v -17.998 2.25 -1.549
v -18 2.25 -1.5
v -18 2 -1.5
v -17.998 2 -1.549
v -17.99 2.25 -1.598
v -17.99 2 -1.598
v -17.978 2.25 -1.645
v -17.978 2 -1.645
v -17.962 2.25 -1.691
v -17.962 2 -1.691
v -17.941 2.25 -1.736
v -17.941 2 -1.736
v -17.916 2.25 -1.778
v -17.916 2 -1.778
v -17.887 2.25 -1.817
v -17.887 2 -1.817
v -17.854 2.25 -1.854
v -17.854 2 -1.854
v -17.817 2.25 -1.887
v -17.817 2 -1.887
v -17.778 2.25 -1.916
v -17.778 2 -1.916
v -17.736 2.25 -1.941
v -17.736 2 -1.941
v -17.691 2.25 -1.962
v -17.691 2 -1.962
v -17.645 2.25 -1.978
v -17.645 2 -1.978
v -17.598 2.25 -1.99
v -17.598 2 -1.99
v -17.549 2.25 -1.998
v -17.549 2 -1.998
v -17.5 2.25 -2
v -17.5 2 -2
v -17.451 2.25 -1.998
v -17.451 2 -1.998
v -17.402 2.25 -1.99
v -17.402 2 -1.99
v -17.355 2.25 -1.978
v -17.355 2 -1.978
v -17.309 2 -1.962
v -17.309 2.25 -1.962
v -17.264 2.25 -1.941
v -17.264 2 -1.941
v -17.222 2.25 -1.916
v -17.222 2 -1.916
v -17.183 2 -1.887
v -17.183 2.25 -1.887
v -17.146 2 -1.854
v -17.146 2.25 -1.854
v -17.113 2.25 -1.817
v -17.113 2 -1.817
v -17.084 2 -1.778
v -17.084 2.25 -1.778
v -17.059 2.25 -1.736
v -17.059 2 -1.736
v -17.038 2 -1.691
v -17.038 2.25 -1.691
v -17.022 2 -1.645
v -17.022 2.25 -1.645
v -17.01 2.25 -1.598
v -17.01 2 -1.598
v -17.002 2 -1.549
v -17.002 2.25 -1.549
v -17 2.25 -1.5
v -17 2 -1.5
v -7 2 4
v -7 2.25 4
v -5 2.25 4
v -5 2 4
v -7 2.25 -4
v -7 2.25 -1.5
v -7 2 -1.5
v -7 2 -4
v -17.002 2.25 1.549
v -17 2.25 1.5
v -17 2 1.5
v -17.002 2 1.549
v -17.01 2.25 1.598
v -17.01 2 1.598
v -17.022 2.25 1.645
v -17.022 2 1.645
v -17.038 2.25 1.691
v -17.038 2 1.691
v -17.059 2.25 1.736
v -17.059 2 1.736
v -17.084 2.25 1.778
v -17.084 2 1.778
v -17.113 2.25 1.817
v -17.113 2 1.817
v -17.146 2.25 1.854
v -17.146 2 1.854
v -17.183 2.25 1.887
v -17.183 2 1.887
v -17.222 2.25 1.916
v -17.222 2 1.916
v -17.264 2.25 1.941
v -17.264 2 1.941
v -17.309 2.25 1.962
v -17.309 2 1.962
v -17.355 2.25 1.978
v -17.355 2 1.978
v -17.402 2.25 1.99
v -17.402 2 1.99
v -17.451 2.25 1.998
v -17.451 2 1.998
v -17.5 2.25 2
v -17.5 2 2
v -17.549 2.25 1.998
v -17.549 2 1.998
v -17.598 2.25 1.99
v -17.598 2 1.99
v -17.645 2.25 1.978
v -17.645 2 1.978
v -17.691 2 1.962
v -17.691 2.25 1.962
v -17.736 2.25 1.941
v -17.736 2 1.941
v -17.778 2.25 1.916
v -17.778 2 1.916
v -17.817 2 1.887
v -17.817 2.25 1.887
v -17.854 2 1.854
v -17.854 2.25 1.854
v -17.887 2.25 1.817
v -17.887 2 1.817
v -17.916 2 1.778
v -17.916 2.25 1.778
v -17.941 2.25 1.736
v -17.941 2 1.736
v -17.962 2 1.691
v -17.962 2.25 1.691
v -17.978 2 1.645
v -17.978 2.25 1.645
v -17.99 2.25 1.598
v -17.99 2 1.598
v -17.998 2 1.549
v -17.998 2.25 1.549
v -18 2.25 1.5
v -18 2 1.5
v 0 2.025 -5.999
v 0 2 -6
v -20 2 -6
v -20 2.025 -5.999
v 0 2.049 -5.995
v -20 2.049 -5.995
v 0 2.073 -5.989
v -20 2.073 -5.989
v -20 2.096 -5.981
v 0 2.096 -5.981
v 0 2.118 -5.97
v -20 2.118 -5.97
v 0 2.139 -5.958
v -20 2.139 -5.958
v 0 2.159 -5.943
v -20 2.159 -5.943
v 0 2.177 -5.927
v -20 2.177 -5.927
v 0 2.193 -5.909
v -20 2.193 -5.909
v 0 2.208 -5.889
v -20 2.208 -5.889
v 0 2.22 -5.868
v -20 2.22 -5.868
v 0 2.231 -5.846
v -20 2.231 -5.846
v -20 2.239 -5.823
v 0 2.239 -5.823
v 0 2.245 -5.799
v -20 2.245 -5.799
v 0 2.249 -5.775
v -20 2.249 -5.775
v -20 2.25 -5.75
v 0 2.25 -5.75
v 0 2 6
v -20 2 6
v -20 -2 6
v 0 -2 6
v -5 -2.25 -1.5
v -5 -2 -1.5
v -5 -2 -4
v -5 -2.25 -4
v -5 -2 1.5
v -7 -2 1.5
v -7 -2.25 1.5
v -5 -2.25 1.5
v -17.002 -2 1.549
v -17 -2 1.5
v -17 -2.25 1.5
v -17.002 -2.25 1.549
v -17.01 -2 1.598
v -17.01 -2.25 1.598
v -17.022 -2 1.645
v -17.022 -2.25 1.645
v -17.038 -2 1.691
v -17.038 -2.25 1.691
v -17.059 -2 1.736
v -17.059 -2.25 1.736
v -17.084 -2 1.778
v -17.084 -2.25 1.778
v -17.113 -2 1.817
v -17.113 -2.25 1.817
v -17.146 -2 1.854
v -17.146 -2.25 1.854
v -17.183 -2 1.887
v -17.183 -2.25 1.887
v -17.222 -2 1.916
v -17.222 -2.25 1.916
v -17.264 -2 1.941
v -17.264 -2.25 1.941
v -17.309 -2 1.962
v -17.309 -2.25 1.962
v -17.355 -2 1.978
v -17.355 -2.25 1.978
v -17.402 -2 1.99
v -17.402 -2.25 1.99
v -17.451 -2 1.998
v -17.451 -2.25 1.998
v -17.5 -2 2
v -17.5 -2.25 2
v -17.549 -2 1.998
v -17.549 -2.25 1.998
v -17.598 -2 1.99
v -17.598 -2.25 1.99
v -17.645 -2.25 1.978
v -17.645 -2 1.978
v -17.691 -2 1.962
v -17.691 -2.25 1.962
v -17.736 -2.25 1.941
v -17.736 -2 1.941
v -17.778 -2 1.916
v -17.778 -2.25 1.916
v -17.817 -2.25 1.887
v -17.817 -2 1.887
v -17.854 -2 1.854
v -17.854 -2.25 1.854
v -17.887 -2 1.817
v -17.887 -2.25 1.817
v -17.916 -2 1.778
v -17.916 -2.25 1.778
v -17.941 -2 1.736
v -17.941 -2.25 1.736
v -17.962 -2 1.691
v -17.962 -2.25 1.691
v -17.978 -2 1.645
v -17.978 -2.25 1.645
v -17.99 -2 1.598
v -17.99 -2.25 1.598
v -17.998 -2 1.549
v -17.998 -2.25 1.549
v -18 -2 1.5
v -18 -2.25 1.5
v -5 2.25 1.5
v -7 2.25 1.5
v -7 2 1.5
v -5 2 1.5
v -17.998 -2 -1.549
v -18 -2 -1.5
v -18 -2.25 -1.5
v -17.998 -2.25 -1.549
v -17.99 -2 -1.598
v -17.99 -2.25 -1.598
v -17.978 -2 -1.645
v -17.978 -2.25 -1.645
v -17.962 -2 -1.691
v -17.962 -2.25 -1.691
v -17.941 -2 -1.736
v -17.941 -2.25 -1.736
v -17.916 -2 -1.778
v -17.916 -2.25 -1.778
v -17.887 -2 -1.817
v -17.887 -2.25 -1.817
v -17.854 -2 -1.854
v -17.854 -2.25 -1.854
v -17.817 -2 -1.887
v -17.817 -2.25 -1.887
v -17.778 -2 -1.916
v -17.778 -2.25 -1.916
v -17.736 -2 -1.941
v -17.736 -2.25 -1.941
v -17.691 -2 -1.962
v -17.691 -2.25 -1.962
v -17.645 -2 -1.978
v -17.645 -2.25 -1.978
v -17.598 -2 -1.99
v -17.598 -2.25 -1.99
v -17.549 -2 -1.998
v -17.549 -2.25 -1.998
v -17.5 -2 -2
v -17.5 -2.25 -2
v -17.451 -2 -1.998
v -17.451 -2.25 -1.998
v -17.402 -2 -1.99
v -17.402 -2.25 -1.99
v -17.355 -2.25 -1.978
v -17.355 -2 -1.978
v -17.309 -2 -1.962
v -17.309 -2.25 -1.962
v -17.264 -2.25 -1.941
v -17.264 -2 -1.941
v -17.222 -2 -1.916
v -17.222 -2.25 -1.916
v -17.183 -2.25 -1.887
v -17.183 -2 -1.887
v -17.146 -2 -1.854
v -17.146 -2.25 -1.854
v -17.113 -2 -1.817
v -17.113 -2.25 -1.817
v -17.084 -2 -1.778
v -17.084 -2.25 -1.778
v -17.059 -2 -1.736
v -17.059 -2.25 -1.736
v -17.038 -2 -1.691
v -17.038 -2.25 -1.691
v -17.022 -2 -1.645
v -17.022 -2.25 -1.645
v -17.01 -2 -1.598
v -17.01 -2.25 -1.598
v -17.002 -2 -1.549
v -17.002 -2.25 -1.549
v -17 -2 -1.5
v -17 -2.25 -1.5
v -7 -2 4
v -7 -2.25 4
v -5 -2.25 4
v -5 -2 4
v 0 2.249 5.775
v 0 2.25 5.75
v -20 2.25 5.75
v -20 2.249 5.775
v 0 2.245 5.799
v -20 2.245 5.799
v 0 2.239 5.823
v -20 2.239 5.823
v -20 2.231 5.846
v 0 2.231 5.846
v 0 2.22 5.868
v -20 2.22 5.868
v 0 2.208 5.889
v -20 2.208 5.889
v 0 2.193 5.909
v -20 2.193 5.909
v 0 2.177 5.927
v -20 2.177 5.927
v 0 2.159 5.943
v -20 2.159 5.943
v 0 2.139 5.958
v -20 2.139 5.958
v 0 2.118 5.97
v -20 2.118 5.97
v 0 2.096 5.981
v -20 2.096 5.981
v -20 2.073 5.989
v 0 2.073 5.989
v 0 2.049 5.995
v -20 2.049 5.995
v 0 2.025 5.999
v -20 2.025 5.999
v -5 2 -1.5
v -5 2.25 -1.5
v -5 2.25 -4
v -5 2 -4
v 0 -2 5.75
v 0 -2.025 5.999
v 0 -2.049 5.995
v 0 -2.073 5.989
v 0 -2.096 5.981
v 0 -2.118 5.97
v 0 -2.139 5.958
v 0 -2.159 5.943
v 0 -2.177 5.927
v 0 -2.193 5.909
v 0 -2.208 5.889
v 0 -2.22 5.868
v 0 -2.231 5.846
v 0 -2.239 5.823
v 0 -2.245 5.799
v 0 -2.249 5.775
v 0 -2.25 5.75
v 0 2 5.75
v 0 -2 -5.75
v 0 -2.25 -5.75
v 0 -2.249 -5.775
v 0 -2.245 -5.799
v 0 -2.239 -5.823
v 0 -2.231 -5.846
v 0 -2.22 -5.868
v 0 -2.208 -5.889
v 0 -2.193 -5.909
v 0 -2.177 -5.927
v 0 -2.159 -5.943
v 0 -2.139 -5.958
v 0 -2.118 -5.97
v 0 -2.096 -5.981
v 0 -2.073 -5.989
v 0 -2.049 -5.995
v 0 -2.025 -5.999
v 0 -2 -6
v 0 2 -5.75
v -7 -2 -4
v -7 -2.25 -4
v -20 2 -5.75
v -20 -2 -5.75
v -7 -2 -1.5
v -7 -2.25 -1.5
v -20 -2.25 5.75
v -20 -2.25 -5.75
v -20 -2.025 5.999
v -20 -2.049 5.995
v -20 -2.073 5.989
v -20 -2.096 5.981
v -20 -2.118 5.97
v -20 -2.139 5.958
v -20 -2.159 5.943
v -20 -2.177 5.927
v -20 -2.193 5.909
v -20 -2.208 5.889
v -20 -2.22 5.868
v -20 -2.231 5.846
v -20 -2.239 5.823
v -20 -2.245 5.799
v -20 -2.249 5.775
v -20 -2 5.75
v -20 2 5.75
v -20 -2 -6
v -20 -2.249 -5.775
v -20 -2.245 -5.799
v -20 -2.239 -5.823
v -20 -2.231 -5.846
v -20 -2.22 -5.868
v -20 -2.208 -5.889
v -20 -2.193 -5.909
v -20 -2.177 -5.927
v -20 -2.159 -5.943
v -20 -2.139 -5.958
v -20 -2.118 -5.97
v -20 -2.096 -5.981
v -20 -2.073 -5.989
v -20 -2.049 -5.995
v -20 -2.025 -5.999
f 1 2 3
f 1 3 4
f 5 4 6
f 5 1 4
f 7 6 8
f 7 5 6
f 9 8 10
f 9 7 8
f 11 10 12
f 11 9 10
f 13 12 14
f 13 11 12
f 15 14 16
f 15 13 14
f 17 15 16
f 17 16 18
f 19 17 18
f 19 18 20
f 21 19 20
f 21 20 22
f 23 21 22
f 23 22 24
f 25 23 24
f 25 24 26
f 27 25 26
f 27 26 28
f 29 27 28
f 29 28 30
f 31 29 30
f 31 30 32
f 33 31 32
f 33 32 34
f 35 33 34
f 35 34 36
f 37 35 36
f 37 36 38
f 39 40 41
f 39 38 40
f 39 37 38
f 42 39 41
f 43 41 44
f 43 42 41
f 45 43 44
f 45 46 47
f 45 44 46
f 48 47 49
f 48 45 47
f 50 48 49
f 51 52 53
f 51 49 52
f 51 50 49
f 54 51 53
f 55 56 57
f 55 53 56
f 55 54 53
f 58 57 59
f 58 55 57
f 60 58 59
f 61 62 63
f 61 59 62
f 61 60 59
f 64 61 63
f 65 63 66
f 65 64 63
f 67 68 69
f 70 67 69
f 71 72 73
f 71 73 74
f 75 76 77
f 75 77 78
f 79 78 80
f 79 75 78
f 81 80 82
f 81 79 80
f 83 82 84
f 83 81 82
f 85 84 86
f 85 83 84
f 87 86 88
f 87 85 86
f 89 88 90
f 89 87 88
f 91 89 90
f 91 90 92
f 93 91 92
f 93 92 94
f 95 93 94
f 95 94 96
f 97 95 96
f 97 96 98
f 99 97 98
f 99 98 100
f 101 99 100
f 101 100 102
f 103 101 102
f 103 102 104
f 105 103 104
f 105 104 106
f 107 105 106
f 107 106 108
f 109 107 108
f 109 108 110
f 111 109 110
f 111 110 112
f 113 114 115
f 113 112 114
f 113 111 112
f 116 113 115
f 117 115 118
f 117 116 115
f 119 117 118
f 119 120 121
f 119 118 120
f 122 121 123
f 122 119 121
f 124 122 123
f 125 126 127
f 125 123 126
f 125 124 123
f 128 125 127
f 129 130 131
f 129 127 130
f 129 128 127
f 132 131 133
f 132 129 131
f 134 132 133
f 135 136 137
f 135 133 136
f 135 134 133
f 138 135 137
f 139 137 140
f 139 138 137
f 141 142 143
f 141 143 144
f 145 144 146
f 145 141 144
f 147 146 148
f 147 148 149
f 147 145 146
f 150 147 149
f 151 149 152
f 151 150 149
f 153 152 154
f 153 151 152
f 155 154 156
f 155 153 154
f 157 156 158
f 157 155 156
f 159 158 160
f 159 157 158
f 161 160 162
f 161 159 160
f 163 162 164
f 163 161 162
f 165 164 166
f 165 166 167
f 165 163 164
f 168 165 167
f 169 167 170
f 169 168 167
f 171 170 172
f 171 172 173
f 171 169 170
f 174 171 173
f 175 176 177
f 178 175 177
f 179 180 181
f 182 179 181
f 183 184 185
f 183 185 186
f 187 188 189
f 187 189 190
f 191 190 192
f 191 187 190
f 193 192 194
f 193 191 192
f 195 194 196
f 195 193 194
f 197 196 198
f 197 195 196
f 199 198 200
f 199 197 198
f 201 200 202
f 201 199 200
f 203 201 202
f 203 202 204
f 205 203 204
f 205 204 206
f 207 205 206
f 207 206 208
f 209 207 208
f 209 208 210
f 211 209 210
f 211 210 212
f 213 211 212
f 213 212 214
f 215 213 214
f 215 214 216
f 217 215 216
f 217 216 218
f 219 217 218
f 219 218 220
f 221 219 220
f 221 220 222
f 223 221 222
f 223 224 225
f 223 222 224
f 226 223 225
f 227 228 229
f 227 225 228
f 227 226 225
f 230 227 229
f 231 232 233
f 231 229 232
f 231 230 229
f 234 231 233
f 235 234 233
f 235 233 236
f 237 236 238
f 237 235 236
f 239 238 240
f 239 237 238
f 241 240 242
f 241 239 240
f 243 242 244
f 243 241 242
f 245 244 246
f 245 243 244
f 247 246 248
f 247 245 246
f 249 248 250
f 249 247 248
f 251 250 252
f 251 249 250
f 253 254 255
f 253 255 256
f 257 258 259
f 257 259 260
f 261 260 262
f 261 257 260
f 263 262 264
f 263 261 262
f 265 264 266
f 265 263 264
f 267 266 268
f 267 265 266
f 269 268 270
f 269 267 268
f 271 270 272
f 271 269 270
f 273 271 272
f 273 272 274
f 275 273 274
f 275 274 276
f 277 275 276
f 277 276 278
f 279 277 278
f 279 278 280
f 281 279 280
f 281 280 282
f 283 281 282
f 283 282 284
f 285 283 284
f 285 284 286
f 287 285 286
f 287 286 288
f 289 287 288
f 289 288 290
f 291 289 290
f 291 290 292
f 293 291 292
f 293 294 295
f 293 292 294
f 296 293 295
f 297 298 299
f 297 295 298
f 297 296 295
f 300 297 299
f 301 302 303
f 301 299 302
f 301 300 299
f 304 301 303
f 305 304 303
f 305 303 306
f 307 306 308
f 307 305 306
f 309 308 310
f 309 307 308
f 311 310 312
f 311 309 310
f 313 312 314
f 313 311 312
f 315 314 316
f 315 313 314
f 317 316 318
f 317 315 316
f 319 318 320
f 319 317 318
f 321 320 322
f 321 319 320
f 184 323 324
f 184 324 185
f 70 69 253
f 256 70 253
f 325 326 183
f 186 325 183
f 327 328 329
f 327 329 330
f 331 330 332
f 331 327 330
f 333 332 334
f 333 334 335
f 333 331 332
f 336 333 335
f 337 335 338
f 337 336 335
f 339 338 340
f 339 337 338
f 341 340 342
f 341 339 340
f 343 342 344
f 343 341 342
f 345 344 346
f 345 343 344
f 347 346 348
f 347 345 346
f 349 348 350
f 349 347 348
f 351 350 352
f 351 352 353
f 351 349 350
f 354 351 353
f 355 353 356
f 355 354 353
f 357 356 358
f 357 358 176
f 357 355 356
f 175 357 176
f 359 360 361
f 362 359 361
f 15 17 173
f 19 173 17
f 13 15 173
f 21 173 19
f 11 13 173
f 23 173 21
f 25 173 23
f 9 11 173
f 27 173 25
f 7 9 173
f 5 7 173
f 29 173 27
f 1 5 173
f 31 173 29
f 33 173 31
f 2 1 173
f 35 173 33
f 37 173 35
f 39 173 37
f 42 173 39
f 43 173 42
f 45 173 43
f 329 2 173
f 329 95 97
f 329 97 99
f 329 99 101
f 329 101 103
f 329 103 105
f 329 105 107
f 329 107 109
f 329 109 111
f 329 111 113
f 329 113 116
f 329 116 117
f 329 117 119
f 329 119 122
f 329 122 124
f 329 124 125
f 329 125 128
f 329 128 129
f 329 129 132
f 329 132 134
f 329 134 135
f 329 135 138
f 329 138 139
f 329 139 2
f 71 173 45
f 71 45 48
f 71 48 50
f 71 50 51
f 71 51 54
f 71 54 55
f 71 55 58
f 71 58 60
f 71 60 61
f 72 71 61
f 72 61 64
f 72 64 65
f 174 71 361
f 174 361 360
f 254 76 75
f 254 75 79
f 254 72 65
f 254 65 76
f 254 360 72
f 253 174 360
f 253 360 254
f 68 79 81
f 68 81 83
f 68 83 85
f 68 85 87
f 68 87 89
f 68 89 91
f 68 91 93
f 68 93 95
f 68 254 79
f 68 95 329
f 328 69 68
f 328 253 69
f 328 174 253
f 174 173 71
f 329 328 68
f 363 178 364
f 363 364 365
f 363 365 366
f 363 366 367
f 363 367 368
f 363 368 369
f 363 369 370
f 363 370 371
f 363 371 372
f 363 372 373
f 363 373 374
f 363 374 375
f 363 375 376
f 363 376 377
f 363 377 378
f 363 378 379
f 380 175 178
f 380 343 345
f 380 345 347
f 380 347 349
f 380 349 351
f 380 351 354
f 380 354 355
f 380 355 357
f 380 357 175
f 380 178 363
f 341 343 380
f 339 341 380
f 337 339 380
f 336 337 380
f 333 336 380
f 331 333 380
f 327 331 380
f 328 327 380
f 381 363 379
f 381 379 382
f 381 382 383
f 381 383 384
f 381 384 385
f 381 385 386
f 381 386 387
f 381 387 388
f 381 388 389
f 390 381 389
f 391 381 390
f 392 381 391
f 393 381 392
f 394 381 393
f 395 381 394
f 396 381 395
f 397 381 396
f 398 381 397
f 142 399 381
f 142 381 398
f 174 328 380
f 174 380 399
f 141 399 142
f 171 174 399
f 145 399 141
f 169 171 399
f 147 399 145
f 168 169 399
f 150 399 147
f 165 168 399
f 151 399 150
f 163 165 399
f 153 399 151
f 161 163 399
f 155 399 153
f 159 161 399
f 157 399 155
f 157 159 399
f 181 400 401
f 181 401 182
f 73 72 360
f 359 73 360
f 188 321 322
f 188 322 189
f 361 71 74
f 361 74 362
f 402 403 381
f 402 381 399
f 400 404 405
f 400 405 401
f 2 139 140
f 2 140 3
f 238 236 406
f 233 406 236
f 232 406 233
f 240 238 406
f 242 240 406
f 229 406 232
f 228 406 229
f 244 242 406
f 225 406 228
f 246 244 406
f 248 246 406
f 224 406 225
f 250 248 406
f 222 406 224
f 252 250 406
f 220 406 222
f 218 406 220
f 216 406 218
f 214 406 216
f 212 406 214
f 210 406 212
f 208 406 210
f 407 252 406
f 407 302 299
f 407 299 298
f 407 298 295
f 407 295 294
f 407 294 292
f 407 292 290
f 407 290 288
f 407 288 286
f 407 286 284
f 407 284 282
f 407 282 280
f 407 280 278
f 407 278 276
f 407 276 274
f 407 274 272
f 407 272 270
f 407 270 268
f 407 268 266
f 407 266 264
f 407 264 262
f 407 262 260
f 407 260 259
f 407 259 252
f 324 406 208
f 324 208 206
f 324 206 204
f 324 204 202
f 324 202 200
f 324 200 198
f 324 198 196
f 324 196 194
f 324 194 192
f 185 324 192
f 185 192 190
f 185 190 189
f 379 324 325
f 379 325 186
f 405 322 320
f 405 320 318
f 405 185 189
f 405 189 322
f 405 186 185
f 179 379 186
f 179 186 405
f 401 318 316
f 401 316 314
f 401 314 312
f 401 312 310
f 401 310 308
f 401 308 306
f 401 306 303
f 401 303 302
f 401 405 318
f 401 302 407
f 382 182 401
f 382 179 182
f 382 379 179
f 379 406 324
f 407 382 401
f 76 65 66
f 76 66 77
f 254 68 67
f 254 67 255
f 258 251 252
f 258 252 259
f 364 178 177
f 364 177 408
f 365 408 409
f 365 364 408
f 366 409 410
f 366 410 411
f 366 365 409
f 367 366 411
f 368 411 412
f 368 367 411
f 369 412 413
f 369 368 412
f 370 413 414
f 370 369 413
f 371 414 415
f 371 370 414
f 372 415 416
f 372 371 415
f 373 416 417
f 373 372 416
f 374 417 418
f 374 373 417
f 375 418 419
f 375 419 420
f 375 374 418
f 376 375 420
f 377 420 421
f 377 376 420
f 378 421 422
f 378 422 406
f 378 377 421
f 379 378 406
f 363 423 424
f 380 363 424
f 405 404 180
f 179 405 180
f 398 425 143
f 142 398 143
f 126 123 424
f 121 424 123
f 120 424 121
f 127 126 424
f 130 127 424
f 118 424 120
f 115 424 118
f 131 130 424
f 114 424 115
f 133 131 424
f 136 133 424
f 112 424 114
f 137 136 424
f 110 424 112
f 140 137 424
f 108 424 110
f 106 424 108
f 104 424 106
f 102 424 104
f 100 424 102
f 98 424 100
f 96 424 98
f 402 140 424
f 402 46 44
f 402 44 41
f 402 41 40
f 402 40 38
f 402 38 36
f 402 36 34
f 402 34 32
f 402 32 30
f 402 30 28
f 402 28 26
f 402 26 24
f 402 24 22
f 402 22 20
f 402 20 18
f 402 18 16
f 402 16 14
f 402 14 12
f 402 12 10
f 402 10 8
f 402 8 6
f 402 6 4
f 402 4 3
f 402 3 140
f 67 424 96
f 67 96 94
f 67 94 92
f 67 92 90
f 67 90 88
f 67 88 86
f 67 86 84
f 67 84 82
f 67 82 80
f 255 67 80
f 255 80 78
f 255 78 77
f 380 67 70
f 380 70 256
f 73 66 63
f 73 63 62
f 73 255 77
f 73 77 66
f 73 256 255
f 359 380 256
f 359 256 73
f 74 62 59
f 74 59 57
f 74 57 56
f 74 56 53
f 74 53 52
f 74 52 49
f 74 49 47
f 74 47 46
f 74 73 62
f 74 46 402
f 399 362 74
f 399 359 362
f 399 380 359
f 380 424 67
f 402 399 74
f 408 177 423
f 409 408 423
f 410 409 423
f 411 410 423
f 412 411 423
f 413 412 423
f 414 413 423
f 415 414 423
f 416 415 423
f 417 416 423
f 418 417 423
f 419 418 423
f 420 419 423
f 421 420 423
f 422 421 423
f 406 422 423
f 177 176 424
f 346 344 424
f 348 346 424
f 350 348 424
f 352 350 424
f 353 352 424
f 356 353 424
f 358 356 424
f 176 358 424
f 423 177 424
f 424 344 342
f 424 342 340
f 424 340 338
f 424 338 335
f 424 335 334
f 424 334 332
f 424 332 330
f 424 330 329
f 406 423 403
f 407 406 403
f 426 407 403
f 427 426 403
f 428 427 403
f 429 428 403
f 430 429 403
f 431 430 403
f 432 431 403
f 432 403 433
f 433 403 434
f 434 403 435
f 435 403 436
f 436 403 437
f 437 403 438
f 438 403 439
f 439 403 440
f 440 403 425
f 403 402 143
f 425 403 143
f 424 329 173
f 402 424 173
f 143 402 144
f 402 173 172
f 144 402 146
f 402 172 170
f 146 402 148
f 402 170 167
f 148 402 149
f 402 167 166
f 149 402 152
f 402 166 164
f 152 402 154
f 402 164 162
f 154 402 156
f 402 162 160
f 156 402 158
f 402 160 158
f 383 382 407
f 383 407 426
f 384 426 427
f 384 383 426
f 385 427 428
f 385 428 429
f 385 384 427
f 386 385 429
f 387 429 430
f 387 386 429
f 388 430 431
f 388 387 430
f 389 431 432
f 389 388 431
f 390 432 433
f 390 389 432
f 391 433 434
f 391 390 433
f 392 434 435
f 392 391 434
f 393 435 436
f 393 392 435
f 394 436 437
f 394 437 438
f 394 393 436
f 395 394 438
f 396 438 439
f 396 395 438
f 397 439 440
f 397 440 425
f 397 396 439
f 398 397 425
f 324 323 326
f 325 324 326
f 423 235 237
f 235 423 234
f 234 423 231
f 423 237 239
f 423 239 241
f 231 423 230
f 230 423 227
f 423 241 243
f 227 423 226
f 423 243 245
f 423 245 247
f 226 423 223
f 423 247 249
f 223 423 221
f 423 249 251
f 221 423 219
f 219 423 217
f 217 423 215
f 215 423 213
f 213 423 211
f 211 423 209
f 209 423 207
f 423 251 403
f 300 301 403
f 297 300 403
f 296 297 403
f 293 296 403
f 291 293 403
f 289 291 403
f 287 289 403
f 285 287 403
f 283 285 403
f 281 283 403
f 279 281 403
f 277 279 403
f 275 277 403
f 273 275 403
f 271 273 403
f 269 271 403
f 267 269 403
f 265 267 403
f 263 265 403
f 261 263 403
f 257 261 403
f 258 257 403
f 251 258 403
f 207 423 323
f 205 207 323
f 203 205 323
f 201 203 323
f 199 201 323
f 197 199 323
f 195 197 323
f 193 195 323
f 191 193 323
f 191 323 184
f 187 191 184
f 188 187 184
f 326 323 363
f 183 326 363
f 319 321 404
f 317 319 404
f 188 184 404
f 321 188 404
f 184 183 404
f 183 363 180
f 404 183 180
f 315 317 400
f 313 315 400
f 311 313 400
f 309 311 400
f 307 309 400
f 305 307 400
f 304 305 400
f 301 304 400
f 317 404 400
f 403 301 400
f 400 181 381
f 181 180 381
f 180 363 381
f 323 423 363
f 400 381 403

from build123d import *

# Parameters (mm, degrees)
MAIN_SHELL_SKETCH_W     = 11.5
MAIN_SHELL_SKETCH_H     = 4
MAIN_SHELL_DEPTH        = 20
CONNECTOR_HOLE_SKETCH_W = 2
CONNECTOR_HOLE_SKETCH_H = 2.5
CONNECTOR_HOLES_DEPTH   = 5.5


with BuildPart() as part:
    # Main_shell_sketch → Main_shell (new body)
    with BuildSketch(Plane(origin=(0, 0, 0), x_dir=(0, 0, -1), z_dir=(1, 0, 0))):
        with BuildLine():
            Line((-6, 2), (-6, -2))
            ThreePointArc((-6, -2), (-5.926776695, -2.176776695), (-5.75, -2.25))
            Line((-5.75, -2.25), (5.75, -2.25))
            ThreePointArc((5.75, -2.25), (5.926776695, -2.176776695), (6, -2))
            Line((6, -2), (6, 2))
            ThreePointArc((6, 2), (5.926776695, 2.176776695), (5.75, 2.25))
            Line((5.75, 2.25), (-5.75, 2.25))
            ThreePointArc((-5.75, 2.25), (-5.926776695, 2.176776695), (-6, 2))
        make_face()
        Rectangle(MAIN_SHELL_SKETCH_W, MAIN_SHELL_SKETCH_H, mode=Mode.SUBTRACT)
    extrude(amount=-MAIN_SHELL_DEPTH)

    # Connector_hole_sketch → Connector_holes (cut, through all)
    with BuildSketch(Plane(origin=(0, 2.25, 0), x_dir=(1, 0, 0), z_dir=(0, 1, 0))):
        with Locations((-6, 2.75)):
            Rectangle(CONNECTOR_HOLE_SKETCH_W, CONNECTOR_HOLE_SKETCH_H)
        with Locations((-6, -2.75)):
            Rectangle(CONNECTOR_HOLE_SKETCH_W, CONNECTOR_HOLE_SKETCH_H)
        with BuildLine():
            Line((-18, -1.5), (-18, 1.5))
            ThreePointArc((-18, 1.5), (-17.5, 2), (-17, 1.5))
            Line((-17, 1.5), (-17, -1.5))
            ThreePointArc((-17, -1.5), (-17.5, -2), (-18, -1.5))
        make_face()
    extrude(amount=-CONNECTOR_HOLES_DEPTH, mode=Mode.SUBTRACT)


solid = part.part
